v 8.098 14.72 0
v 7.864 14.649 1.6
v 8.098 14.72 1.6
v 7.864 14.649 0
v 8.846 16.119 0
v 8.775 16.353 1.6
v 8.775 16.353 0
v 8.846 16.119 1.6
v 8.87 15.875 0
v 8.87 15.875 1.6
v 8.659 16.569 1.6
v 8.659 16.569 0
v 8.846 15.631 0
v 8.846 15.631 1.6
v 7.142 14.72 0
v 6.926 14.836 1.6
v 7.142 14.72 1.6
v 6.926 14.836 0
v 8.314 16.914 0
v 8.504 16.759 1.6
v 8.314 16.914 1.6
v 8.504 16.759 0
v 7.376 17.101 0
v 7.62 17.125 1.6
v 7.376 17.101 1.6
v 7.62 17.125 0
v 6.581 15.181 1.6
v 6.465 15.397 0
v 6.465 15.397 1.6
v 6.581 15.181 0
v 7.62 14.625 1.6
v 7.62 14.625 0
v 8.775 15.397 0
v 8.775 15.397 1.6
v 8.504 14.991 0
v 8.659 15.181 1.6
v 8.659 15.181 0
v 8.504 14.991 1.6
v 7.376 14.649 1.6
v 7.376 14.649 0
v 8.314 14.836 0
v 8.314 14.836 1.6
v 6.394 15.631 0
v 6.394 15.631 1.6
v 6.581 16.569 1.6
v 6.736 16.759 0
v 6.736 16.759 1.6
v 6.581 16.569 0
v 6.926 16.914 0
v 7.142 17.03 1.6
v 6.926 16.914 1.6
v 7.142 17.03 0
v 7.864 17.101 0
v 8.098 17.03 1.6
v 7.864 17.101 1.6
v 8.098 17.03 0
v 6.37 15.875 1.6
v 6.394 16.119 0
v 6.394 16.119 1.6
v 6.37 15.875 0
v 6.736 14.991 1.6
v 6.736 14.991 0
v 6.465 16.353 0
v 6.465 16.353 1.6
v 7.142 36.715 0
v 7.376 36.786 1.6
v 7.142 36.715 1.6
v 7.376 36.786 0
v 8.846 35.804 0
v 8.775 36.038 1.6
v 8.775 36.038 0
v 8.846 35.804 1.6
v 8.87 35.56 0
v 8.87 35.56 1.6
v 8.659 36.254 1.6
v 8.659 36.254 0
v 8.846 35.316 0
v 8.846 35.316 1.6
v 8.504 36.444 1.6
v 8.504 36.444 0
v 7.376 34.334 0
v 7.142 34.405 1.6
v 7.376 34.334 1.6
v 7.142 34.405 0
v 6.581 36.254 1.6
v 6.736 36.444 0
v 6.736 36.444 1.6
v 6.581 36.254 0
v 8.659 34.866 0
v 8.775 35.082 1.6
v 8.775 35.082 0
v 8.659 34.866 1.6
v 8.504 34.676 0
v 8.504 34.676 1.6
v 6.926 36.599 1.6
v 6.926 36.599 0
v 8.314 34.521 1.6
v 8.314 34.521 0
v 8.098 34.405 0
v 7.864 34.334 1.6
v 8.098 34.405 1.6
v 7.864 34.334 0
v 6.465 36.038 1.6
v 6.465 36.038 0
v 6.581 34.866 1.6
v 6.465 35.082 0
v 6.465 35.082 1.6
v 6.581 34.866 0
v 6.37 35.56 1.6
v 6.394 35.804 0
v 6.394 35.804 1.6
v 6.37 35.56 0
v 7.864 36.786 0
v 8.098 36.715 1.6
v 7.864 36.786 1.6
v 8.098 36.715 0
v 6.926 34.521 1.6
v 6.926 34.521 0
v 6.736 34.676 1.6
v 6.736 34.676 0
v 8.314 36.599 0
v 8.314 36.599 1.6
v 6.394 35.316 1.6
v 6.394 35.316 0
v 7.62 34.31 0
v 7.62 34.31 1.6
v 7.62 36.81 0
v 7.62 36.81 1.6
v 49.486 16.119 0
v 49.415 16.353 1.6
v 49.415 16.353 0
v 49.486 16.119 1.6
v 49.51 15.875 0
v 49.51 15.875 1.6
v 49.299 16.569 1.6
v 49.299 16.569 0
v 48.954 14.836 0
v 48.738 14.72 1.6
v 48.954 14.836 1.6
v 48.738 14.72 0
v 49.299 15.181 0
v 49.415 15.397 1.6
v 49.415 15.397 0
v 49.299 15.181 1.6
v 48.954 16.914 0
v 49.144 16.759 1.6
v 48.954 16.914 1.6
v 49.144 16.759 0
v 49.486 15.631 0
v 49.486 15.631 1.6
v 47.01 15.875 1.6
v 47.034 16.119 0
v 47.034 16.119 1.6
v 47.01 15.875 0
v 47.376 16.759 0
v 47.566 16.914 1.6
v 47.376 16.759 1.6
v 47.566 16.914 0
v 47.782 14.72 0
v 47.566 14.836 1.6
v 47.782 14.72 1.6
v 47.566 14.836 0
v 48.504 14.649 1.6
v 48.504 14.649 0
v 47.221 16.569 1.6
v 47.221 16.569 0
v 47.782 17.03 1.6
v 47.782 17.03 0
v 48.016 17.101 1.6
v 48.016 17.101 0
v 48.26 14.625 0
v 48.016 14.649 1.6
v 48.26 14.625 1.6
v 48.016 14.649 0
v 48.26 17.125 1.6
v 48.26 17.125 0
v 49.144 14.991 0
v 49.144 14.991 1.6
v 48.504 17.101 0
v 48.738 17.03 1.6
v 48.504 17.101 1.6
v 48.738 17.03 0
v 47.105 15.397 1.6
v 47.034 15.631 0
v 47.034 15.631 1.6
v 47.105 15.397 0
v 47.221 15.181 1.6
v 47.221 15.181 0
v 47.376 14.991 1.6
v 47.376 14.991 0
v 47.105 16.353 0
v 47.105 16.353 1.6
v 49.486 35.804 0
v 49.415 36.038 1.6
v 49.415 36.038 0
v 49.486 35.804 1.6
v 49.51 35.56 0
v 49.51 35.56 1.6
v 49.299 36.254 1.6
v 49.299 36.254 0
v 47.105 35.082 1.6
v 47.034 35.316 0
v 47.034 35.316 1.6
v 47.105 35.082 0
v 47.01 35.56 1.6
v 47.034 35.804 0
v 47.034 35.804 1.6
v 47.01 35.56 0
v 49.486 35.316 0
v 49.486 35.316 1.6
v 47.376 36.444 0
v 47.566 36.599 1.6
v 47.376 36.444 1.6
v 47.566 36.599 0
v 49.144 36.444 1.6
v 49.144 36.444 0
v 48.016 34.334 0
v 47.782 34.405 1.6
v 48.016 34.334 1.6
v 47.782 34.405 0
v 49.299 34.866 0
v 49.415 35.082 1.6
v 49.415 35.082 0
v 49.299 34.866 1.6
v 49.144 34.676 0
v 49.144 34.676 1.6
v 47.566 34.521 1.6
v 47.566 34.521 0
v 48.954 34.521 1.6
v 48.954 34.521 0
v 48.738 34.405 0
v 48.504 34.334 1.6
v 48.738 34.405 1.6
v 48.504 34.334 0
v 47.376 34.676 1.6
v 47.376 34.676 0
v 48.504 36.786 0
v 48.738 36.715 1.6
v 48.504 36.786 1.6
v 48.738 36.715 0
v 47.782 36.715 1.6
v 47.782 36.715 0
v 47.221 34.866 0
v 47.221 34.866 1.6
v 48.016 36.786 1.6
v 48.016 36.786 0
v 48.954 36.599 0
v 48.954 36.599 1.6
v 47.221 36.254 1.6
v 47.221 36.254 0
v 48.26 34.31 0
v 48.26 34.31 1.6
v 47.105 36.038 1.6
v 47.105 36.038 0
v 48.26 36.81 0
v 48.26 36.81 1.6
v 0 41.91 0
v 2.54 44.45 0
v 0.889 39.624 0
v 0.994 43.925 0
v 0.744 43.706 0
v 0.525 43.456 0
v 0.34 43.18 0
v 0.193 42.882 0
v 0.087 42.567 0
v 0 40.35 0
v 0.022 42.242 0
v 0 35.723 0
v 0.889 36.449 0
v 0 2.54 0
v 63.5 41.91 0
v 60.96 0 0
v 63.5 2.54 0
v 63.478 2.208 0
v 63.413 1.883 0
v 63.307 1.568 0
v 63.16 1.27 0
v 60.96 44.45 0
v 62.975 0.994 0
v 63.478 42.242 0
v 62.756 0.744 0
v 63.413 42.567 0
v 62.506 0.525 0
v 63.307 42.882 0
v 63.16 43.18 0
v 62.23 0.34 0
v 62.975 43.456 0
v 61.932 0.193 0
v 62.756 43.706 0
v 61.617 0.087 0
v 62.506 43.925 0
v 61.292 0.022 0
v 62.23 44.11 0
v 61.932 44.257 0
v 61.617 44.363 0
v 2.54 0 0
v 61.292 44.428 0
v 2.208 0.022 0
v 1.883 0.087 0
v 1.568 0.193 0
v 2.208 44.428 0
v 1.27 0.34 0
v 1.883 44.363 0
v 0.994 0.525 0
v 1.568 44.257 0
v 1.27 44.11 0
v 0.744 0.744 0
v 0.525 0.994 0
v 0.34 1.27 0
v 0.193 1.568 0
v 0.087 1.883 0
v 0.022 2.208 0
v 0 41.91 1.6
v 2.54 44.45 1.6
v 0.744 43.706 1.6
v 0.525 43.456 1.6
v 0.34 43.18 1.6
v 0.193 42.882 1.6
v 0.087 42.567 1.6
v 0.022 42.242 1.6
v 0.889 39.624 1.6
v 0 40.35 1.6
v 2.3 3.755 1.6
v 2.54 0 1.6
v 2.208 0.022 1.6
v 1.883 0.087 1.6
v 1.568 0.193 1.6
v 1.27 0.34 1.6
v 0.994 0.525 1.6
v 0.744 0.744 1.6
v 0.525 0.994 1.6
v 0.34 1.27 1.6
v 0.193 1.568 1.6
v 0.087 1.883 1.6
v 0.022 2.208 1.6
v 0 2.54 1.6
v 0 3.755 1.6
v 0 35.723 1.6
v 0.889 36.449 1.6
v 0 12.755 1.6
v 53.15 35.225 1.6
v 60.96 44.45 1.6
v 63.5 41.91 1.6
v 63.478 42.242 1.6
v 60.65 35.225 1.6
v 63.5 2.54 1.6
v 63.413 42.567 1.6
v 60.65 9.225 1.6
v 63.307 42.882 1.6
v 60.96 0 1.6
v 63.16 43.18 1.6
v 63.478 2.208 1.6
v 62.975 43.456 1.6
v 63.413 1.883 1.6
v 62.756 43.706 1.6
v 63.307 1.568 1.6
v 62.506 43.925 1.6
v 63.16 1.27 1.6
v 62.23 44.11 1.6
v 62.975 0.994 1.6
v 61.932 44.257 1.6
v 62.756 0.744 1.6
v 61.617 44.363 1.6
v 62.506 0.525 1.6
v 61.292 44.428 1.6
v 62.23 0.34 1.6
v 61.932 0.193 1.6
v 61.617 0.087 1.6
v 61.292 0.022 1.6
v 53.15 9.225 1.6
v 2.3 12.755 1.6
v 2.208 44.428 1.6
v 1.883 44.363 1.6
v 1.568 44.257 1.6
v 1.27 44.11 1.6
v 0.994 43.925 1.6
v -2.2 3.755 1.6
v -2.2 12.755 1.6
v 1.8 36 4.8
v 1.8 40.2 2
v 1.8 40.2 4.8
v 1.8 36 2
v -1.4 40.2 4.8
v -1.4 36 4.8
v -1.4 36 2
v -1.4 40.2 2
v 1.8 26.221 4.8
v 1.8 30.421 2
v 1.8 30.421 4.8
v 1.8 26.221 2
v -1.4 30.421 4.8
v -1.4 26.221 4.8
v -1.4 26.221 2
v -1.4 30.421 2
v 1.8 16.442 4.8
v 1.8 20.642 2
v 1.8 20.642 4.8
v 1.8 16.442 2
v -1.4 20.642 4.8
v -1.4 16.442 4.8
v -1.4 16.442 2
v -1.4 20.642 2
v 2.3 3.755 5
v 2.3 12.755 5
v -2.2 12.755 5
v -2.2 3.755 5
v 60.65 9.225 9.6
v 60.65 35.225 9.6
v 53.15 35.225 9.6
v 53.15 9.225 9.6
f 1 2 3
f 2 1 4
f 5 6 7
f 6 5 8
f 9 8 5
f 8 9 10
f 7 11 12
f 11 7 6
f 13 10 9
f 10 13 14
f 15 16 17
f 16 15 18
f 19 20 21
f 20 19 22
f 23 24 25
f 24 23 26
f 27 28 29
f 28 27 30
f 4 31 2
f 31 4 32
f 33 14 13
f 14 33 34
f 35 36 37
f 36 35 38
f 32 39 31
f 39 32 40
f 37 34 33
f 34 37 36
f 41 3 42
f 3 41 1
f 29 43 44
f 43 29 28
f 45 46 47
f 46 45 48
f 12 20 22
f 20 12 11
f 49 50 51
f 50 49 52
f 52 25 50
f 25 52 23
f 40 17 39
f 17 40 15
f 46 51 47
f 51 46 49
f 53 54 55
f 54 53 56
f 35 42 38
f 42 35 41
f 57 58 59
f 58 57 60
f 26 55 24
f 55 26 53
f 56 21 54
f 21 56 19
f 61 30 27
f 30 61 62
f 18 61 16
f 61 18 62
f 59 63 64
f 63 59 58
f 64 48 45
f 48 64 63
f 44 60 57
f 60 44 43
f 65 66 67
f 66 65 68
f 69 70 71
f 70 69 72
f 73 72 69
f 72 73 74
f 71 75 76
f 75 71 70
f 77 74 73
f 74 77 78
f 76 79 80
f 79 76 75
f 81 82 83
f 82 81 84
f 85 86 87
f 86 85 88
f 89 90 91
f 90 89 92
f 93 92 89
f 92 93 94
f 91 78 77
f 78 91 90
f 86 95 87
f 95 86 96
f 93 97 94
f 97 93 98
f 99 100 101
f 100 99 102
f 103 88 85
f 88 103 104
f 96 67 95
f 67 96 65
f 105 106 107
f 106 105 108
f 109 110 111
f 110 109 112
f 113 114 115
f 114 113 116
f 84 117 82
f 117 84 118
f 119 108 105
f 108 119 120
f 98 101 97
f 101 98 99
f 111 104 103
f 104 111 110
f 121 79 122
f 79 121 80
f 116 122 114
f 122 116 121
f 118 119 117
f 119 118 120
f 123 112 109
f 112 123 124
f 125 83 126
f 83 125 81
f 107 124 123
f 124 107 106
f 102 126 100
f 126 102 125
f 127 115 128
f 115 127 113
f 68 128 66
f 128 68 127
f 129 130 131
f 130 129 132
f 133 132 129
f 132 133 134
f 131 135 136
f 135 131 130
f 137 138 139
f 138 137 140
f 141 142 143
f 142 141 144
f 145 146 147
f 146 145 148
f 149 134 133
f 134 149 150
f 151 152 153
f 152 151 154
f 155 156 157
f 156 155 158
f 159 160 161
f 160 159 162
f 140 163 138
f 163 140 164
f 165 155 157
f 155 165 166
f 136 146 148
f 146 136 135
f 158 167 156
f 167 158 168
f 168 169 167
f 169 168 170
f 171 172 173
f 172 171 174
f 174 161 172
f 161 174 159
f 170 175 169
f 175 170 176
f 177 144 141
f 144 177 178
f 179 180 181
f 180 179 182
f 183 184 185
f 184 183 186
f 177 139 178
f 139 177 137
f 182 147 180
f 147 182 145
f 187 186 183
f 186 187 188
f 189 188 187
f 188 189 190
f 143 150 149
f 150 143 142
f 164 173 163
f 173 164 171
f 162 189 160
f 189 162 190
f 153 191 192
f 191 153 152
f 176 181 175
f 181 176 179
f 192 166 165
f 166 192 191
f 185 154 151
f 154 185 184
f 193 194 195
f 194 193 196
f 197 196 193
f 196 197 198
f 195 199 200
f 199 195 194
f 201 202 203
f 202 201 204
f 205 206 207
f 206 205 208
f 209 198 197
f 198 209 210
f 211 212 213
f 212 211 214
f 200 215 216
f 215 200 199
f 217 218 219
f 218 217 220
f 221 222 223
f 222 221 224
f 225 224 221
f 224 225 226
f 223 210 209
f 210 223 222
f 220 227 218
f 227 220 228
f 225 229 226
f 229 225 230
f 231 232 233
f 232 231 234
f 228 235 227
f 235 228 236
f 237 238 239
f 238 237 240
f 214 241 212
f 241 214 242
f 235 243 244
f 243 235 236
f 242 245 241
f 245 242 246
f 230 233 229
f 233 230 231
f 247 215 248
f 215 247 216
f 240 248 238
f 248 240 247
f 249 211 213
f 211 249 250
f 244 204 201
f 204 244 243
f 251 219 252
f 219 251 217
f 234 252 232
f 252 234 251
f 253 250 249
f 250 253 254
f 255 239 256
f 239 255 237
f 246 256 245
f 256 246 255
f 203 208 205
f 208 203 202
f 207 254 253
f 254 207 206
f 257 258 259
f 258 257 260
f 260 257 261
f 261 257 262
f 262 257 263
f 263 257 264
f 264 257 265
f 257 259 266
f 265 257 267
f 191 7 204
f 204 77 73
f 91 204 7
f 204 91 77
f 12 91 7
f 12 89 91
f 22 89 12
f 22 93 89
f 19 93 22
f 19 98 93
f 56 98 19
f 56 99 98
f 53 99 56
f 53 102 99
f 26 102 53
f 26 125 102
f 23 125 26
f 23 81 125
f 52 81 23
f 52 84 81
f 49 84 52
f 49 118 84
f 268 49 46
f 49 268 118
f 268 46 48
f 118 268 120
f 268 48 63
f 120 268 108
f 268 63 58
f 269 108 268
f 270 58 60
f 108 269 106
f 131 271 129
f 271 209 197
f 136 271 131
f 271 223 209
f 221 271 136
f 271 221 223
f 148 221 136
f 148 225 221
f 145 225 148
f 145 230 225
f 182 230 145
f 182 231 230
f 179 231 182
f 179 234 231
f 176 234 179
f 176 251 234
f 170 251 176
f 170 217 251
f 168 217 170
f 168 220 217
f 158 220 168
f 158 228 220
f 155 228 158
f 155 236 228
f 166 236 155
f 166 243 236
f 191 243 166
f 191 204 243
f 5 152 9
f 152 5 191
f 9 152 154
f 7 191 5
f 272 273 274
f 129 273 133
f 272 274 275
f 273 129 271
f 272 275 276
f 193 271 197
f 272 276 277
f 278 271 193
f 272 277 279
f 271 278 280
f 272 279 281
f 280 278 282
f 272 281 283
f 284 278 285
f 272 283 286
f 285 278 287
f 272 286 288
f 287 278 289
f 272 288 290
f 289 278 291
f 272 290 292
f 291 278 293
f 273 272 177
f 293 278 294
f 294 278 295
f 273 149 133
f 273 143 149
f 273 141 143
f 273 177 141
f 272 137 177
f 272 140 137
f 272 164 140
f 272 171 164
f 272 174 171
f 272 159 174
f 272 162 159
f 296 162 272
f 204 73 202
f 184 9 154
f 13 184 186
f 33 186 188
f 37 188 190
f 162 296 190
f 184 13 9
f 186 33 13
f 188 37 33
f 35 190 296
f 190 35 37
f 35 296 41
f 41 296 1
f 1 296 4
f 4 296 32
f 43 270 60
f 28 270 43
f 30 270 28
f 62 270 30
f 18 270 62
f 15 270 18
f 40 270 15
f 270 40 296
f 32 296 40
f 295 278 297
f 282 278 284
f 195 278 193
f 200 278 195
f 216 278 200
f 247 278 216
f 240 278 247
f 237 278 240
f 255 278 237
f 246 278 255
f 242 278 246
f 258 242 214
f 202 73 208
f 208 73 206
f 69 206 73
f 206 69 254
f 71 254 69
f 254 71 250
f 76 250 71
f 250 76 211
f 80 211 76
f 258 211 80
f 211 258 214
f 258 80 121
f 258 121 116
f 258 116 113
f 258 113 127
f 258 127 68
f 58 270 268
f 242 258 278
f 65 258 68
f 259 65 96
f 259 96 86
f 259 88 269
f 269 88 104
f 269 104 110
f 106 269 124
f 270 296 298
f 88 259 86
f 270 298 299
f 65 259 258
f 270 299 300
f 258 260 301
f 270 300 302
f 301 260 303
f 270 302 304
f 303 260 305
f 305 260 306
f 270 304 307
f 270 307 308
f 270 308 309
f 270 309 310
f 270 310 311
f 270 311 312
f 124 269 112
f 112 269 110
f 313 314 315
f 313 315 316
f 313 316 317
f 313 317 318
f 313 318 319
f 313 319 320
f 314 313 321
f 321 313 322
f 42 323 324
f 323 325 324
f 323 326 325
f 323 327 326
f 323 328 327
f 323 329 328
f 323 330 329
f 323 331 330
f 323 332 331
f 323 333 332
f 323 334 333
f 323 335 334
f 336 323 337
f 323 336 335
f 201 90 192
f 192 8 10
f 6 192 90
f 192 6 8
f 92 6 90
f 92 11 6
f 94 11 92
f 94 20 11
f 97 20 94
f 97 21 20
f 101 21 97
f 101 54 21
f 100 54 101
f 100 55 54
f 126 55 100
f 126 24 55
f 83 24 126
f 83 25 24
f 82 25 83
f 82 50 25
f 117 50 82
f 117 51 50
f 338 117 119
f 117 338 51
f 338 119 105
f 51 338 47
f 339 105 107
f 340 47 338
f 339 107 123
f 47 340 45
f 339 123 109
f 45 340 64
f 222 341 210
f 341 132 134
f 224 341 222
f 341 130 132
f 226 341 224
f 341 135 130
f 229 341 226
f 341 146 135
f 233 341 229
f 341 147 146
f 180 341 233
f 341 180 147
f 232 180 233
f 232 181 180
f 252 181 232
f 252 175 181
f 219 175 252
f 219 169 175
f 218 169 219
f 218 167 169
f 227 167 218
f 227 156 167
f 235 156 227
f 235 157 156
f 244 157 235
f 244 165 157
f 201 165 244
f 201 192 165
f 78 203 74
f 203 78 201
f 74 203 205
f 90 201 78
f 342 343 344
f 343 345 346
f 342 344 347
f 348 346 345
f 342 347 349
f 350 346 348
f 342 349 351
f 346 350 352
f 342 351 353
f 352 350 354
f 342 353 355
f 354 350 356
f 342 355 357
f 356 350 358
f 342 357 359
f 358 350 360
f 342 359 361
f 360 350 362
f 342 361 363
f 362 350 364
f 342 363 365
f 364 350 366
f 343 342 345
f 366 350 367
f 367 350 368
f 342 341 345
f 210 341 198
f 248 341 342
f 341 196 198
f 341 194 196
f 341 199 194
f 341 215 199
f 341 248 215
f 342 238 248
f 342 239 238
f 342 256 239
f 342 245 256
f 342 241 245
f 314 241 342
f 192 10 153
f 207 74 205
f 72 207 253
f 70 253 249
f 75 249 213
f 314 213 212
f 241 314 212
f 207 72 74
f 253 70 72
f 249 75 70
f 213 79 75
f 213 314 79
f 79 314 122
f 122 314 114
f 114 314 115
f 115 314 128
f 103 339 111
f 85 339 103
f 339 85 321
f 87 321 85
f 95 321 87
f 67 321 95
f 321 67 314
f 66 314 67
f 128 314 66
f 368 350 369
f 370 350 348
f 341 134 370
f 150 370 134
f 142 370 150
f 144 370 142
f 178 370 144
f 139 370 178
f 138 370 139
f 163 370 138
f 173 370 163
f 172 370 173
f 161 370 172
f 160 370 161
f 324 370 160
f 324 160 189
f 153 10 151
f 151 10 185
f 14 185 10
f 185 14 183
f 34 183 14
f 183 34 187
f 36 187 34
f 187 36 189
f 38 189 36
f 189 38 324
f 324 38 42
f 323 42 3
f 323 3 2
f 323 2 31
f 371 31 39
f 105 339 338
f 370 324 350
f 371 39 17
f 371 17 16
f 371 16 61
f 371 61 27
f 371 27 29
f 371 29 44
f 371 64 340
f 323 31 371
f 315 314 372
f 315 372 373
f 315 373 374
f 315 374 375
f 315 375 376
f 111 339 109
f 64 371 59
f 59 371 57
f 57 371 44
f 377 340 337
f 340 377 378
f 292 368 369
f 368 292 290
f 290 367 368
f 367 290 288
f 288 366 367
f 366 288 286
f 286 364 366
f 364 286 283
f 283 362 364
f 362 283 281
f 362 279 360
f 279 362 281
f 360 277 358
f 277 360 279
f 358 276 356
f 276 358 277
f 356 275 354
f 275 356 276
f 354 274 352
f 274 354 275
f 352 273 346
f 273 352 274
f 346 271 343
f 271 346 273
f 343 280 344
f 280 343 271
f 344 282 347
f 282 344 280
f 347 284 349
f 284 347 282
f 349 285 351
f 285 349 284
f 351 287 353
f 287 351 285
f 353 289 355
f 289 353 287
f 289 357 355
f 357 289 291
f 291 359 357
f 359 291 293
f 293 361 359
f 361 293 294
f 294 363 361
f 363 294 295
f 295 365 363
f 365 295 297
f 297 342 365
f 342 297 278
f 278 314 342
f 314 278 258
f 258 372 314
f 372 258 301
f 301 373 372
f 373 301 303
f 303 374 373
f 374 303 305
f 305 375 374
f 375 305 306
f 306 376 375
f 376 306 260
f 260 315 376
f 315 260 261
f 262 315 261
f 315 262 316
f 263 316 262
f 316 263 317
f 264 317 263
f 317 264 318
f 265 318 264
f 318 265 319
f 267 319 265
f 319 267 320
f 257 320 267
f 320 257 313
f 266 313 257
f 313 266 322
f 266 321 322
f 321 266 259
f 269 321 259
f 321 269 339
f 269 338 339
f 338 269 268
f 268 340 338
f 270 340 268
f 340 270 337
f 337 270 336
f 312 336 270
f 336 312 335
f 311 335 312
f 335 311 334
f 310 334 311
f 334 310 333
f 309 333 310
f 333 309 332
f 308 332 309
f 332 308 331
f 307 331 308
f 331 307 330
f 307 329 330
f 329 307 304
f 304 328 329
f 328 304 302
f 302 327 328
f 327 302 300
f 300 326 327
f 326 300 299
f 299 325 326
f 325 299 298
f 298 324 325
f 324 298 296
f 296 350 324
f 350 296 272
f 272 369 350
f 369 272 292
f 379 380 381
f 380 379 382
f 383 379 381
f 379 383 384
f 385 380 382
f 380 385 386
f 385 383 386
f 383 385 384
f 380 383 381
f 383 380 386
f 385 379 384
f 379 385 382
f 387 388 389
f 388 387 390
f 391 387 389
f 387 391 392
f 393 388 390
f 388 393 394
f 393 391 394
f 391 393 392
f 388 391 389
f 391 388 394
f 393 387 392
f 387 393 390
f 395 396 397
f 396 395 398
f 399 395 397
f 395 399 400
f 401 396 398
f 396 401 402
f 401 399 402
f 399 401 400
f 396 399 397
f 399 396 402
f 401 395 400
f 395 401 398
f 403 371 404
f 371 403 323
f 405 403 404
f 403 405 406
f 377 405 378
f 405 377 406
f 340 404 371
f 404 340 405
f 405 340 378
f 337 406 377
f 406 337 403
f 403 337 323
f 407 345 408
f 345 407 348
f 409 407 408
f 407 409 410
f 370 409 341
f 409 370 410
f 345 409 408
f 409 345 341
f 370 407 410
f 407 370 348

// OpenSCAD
// file: ../schematics/matrixportal_s3_REFERENCE.scad
include <../matrixportal/matrixportal_s3_mount.scad>;

// Official Eagle-derived mechanical reference. This is not a printable part.
matrixportal_s3_reference(true);
// main file
// Issue #178 MatrixPortal S3 screw-on adapter.
// Prototype dimensions follow the non-printing mechanical reference. Confirm
// populated-board, connector and cable clearances against the real board.

include <../direct_mount_enclosure.scad>;
include <../schematics/matrixportal_s3_REFERENCE.scad>;

mp_adapter_w = 66;
mp_adapter_h = 60;
mp_adapter_t = 3.2;
mp_adapter_corner_r = 3;
mp_adapter_centre_x = 222;
mp_adapter_centre_y = 90.5;

pcb_w = 63.5;
pcb_h = 44.45;
pcb_t = 1.6;
pcb_x0 = -32;
pcb_y0 = -22.225;
pcb_standoff_h = 8;
pcb_hole_d = 2.8;
pcb_standoff_d = 8;
pcb_nut_af = 5.0; // M2.5 hex nut nominal across-flats prototype pocket
pcb_nut_depth = 2.2;
pcb_nut_pocket_clearance = 0.25;

enclosure_columns = [224];
enclosure_rows = [71.5, 90.5, 109.5];
boss_d = 7;
boss_h = 4;
boss_overlap = 0.3;
boss_projection = boss_h - boss_overlap;
boss_pocket_d = 7.5;
boss_pocket_depth = 1.2;
enclosure_screw_clearance_d = 3.6;
enclosure_screw_head_d = 7;
enclosure_screw_head_depth = 0.8;
// The local -Z mounting face points toward the wall (+global Z after the
// assembly flip). The pocket roof sits 1.2 mm beyond the cavity-facing tip.
mp_adapter_wall_z = universal_deep_front_z;
adapter_boss_tip_z = mp_adapter_wall_z - boss_h + boss_overlap;
adapter_back_z = adapter_boss_tip_z + boss_pocket_depth;
backplane_connector_clearance = 0.4;
connector_relief_global_x0 =
    service_x + service_w - top_connector_pad_w - backplane_connector_clearance;
connector_relief_global_x1 = mp_adapter_centre_x + mp_adapter_w/2 + 1;
connector_relief_global_y0 = top_connector_pad_y0-backplane_connector_clearance;
connector_relief_global_y1 = top_connector_pad_y1+backplane_connector_clearance;
connector_relief_depth =
    adapter_back_z - (universal_deep_rear_z-top_connector_pad_depth)
        + backplane_connector_clearance;

// Board-hole coordinates from the lower-left after 180 degree in-plane turn.
pcb_hole_x = [7.62, 48.26];
pcb_hole_y = [15.875, 35.56];
pcb_mount_points = [
    for (x = pcb_hole_x)
        for (y = pcb_hole_y)
            [pcb_x0 + x, pcb_y0 + y]
];

function hex_circumdiameter(across_flats) =
    across_flats / cos(30);

module rounded_adapter_outline() {
    offset(r=mp_adapter_corner_r)
        square([mp_adapter_w-2*mp_adapter_corner_r,
                mp_adapter_h-2*mp_adapter_corner_r], center=true);
}

module enclosure_mount_cutters() {
    for (xx = enclosure_columns)
        for (yy = enclosure_rows) {
            lx = xx-mp_adapter_centre_x;
            ly = yy-mp_adapter_centre_y;
            // Clear the projecting boss from the adapter's back face.
            translate([lx,ly,-0.01])
                cylinder(d=boss_pocket_d,h=boss_pocket_depth+0.01);
            // Through screw clearance and a head recess on the board-facing face.
            translate([lx,ly,-0.01])
                cylinder(d=enclosure_screw_clearance_d,h=mp_adapter_t+0.02);
            translate([lx,ly,mp_adapter_t-enclosure_screw_head_depth])
                cylinder(d=enclosure_screw_head_d,
                         h=enclosure_screw_head_depth+0.02);
        }
}

module pcb_standoffs() {
    for (pt = pcb_mount_points)
        translate([pt[0],pt[1],mp_adapter_t])
            cylinder(d=pcb_standoff_d,h=pcb_standoff_h,$fn=48);
}

module pcb_standoff_cutters() {
    for (pt = pcb_mount_points) {
        // Through clearance; hexagonal captive-nut pocket opens from the top.
        translate([pt[0],pt[1],-0.01])
            cylinder(d=pcb_hole_d,h=mp_adapter_t+pcb_standoff_h+0.02,$fn=32);
        // Side-load the nut so the PCB seats directly on the post top. The
        // screw enters from above and threads into the retained nut below it.
        translate([pt[0],pt[1],mp_adapter_t+pcb_standoff_h-pcb_nut_depth-0.5])
            cylinder(d=hex_circumdiameter(pcb_nut_af)+pcb_nut_pocket_clearance,
                     h=pcb_nut_depth+0.02,$fn=6);
        translate([pt[0]-pcb_standoff_d/2-0.01,
                   pt[1]-(pcb_nut_af+pcb_nut_pocket_clearance)/2,
                   mp_adapter_t+pcb_standoff_h-pcb_nut_depth-0.5])
            cube([pcb_standoff_d/2+0.02,pcb_nut_af+pcb_nut_pocket_clearance,
                  pcb_nut_depth+0.02]);
    }
}

module backplane_connector_clearance_cutter() {
    // The top-right module seam pad projects 6.5 mm from the backplane.
    // Its shallow taper reaches the adapter's rear edge; pocket that region
    // without touching the PCB standoff lands or modifying enclosure geometry.
    translate([
        connector_relief_global_x0-mp_adapter_centre_x,
        mp_adapter_centre_y-connector_relief_global_y1,
        -0.01
    ])
        cube([
            connector_relief_global_x1-connector_relief_global_x0,
            connector_relief_global_y1-connector_relief_global_y0,
            connector_relief_depth+0.01
        ]);
}

module matrixportal_adapter() {
    difference() {
        union() {
            linear_extrude(height=mp_adapter_t)
                rounded_adapter_outline();
            pcb_standoffs();
        }
        enclosure_mount_cutters();
        pcb_standoff_cutters();
        backplane_connector_clearance_cutter();
    }
}

module matrixportal_adapter_installed(show_board=true) {
    translate([mp_adapter_centre_x,mp_adapter_centre_y,adapter_back_z]) {
        // Local +Z is cavity-facing; flip the print pose over the X axis for
        // installation against the backplane. This mirrors local Y only.
        rotate([180,0,0]) {
            matrixportal_adapter();
            if (show_board)
                translate([pcb_x0+pcb_w/2,pcb_y0+pcb_h/2,
                           mp_adapter_t+pcb_standoff_h])
                    rotate([0,0,180])
                        translate([-pcb_w/2,-pcb_h/2,0])
                            matrixportal_s3_reference();
        }
    }
}

module matrixportal_adapter_print_pose() {
    // Print the plate face-down with standoffs vertical. The mounting recesses
    // remain open to the build plate; the 3.2 mm plate contacts Z=0.
    matrixportal_adapter();
}

assert(mp_adapter_w == 66 && mp_adapter_h == 60 && mp_adapter_t == 3.2,
       "Issue #178 adapter prototype envelope changed");
assert(abs(adapter_back_z-(universal_deep_front_z-2.5)) < 0.01,
       "Adapter must register with 1.2 mm boss engagement");
assert(abs((mp_adapter_centre_x-mp_adapter_w/2)-189)<0.01 &&
       abs((mp_adapter_centre_x+mp_adapter_w/2)-255)<0.01 &&
       abs((mp_adapter_centre_y-mp_adapter_h/2)-60.5)<0.01 &&
       abs((mp_adapter_centre_y+mp_adapter_h/2)-120.5)<0.01,
       "Adapter prototype enclosure coordinates drifted");
assert(abs((mp_adapter_centre_x-mp_adapter_w/2)-187-2)<0.01,
       "Adapter plate must retain 2 mm X clearance to the PSU dock plate");
assert(abs((service_x+service_w)-(mp_adapter_centre_x+mp_adapter_w/2)-0.5)<0.01,
       "Adapter must retain 0.5 mm clearance to the nominal right backplane edge");
assert(len(pcb_mount_points) == 4 &&
       abs(pcb_mount_points[0][0]+24.38)<0.001 &&
       abs(pcb_mount_points[0][1]+6.35)<0.001 &&
       abs(pcb_mount_points[1][0]+24.38)<0.001 &&
       abs(pcb_mount_points[1][1]-13.335)<0.001 &&
       abs(pcb_mount_points[2][0]-16.26)<0.001 &&
       abs(pcb_mount_points[2][1]+6.35)<0.001 &&
       abs(pcb_mount_points[3][0]-16.26)<0.001 &&
       abs(pcb_mount_points[3][1]-13.335)<0.001,
       "MatrixPortal mounting-hole coordinates drifted");
